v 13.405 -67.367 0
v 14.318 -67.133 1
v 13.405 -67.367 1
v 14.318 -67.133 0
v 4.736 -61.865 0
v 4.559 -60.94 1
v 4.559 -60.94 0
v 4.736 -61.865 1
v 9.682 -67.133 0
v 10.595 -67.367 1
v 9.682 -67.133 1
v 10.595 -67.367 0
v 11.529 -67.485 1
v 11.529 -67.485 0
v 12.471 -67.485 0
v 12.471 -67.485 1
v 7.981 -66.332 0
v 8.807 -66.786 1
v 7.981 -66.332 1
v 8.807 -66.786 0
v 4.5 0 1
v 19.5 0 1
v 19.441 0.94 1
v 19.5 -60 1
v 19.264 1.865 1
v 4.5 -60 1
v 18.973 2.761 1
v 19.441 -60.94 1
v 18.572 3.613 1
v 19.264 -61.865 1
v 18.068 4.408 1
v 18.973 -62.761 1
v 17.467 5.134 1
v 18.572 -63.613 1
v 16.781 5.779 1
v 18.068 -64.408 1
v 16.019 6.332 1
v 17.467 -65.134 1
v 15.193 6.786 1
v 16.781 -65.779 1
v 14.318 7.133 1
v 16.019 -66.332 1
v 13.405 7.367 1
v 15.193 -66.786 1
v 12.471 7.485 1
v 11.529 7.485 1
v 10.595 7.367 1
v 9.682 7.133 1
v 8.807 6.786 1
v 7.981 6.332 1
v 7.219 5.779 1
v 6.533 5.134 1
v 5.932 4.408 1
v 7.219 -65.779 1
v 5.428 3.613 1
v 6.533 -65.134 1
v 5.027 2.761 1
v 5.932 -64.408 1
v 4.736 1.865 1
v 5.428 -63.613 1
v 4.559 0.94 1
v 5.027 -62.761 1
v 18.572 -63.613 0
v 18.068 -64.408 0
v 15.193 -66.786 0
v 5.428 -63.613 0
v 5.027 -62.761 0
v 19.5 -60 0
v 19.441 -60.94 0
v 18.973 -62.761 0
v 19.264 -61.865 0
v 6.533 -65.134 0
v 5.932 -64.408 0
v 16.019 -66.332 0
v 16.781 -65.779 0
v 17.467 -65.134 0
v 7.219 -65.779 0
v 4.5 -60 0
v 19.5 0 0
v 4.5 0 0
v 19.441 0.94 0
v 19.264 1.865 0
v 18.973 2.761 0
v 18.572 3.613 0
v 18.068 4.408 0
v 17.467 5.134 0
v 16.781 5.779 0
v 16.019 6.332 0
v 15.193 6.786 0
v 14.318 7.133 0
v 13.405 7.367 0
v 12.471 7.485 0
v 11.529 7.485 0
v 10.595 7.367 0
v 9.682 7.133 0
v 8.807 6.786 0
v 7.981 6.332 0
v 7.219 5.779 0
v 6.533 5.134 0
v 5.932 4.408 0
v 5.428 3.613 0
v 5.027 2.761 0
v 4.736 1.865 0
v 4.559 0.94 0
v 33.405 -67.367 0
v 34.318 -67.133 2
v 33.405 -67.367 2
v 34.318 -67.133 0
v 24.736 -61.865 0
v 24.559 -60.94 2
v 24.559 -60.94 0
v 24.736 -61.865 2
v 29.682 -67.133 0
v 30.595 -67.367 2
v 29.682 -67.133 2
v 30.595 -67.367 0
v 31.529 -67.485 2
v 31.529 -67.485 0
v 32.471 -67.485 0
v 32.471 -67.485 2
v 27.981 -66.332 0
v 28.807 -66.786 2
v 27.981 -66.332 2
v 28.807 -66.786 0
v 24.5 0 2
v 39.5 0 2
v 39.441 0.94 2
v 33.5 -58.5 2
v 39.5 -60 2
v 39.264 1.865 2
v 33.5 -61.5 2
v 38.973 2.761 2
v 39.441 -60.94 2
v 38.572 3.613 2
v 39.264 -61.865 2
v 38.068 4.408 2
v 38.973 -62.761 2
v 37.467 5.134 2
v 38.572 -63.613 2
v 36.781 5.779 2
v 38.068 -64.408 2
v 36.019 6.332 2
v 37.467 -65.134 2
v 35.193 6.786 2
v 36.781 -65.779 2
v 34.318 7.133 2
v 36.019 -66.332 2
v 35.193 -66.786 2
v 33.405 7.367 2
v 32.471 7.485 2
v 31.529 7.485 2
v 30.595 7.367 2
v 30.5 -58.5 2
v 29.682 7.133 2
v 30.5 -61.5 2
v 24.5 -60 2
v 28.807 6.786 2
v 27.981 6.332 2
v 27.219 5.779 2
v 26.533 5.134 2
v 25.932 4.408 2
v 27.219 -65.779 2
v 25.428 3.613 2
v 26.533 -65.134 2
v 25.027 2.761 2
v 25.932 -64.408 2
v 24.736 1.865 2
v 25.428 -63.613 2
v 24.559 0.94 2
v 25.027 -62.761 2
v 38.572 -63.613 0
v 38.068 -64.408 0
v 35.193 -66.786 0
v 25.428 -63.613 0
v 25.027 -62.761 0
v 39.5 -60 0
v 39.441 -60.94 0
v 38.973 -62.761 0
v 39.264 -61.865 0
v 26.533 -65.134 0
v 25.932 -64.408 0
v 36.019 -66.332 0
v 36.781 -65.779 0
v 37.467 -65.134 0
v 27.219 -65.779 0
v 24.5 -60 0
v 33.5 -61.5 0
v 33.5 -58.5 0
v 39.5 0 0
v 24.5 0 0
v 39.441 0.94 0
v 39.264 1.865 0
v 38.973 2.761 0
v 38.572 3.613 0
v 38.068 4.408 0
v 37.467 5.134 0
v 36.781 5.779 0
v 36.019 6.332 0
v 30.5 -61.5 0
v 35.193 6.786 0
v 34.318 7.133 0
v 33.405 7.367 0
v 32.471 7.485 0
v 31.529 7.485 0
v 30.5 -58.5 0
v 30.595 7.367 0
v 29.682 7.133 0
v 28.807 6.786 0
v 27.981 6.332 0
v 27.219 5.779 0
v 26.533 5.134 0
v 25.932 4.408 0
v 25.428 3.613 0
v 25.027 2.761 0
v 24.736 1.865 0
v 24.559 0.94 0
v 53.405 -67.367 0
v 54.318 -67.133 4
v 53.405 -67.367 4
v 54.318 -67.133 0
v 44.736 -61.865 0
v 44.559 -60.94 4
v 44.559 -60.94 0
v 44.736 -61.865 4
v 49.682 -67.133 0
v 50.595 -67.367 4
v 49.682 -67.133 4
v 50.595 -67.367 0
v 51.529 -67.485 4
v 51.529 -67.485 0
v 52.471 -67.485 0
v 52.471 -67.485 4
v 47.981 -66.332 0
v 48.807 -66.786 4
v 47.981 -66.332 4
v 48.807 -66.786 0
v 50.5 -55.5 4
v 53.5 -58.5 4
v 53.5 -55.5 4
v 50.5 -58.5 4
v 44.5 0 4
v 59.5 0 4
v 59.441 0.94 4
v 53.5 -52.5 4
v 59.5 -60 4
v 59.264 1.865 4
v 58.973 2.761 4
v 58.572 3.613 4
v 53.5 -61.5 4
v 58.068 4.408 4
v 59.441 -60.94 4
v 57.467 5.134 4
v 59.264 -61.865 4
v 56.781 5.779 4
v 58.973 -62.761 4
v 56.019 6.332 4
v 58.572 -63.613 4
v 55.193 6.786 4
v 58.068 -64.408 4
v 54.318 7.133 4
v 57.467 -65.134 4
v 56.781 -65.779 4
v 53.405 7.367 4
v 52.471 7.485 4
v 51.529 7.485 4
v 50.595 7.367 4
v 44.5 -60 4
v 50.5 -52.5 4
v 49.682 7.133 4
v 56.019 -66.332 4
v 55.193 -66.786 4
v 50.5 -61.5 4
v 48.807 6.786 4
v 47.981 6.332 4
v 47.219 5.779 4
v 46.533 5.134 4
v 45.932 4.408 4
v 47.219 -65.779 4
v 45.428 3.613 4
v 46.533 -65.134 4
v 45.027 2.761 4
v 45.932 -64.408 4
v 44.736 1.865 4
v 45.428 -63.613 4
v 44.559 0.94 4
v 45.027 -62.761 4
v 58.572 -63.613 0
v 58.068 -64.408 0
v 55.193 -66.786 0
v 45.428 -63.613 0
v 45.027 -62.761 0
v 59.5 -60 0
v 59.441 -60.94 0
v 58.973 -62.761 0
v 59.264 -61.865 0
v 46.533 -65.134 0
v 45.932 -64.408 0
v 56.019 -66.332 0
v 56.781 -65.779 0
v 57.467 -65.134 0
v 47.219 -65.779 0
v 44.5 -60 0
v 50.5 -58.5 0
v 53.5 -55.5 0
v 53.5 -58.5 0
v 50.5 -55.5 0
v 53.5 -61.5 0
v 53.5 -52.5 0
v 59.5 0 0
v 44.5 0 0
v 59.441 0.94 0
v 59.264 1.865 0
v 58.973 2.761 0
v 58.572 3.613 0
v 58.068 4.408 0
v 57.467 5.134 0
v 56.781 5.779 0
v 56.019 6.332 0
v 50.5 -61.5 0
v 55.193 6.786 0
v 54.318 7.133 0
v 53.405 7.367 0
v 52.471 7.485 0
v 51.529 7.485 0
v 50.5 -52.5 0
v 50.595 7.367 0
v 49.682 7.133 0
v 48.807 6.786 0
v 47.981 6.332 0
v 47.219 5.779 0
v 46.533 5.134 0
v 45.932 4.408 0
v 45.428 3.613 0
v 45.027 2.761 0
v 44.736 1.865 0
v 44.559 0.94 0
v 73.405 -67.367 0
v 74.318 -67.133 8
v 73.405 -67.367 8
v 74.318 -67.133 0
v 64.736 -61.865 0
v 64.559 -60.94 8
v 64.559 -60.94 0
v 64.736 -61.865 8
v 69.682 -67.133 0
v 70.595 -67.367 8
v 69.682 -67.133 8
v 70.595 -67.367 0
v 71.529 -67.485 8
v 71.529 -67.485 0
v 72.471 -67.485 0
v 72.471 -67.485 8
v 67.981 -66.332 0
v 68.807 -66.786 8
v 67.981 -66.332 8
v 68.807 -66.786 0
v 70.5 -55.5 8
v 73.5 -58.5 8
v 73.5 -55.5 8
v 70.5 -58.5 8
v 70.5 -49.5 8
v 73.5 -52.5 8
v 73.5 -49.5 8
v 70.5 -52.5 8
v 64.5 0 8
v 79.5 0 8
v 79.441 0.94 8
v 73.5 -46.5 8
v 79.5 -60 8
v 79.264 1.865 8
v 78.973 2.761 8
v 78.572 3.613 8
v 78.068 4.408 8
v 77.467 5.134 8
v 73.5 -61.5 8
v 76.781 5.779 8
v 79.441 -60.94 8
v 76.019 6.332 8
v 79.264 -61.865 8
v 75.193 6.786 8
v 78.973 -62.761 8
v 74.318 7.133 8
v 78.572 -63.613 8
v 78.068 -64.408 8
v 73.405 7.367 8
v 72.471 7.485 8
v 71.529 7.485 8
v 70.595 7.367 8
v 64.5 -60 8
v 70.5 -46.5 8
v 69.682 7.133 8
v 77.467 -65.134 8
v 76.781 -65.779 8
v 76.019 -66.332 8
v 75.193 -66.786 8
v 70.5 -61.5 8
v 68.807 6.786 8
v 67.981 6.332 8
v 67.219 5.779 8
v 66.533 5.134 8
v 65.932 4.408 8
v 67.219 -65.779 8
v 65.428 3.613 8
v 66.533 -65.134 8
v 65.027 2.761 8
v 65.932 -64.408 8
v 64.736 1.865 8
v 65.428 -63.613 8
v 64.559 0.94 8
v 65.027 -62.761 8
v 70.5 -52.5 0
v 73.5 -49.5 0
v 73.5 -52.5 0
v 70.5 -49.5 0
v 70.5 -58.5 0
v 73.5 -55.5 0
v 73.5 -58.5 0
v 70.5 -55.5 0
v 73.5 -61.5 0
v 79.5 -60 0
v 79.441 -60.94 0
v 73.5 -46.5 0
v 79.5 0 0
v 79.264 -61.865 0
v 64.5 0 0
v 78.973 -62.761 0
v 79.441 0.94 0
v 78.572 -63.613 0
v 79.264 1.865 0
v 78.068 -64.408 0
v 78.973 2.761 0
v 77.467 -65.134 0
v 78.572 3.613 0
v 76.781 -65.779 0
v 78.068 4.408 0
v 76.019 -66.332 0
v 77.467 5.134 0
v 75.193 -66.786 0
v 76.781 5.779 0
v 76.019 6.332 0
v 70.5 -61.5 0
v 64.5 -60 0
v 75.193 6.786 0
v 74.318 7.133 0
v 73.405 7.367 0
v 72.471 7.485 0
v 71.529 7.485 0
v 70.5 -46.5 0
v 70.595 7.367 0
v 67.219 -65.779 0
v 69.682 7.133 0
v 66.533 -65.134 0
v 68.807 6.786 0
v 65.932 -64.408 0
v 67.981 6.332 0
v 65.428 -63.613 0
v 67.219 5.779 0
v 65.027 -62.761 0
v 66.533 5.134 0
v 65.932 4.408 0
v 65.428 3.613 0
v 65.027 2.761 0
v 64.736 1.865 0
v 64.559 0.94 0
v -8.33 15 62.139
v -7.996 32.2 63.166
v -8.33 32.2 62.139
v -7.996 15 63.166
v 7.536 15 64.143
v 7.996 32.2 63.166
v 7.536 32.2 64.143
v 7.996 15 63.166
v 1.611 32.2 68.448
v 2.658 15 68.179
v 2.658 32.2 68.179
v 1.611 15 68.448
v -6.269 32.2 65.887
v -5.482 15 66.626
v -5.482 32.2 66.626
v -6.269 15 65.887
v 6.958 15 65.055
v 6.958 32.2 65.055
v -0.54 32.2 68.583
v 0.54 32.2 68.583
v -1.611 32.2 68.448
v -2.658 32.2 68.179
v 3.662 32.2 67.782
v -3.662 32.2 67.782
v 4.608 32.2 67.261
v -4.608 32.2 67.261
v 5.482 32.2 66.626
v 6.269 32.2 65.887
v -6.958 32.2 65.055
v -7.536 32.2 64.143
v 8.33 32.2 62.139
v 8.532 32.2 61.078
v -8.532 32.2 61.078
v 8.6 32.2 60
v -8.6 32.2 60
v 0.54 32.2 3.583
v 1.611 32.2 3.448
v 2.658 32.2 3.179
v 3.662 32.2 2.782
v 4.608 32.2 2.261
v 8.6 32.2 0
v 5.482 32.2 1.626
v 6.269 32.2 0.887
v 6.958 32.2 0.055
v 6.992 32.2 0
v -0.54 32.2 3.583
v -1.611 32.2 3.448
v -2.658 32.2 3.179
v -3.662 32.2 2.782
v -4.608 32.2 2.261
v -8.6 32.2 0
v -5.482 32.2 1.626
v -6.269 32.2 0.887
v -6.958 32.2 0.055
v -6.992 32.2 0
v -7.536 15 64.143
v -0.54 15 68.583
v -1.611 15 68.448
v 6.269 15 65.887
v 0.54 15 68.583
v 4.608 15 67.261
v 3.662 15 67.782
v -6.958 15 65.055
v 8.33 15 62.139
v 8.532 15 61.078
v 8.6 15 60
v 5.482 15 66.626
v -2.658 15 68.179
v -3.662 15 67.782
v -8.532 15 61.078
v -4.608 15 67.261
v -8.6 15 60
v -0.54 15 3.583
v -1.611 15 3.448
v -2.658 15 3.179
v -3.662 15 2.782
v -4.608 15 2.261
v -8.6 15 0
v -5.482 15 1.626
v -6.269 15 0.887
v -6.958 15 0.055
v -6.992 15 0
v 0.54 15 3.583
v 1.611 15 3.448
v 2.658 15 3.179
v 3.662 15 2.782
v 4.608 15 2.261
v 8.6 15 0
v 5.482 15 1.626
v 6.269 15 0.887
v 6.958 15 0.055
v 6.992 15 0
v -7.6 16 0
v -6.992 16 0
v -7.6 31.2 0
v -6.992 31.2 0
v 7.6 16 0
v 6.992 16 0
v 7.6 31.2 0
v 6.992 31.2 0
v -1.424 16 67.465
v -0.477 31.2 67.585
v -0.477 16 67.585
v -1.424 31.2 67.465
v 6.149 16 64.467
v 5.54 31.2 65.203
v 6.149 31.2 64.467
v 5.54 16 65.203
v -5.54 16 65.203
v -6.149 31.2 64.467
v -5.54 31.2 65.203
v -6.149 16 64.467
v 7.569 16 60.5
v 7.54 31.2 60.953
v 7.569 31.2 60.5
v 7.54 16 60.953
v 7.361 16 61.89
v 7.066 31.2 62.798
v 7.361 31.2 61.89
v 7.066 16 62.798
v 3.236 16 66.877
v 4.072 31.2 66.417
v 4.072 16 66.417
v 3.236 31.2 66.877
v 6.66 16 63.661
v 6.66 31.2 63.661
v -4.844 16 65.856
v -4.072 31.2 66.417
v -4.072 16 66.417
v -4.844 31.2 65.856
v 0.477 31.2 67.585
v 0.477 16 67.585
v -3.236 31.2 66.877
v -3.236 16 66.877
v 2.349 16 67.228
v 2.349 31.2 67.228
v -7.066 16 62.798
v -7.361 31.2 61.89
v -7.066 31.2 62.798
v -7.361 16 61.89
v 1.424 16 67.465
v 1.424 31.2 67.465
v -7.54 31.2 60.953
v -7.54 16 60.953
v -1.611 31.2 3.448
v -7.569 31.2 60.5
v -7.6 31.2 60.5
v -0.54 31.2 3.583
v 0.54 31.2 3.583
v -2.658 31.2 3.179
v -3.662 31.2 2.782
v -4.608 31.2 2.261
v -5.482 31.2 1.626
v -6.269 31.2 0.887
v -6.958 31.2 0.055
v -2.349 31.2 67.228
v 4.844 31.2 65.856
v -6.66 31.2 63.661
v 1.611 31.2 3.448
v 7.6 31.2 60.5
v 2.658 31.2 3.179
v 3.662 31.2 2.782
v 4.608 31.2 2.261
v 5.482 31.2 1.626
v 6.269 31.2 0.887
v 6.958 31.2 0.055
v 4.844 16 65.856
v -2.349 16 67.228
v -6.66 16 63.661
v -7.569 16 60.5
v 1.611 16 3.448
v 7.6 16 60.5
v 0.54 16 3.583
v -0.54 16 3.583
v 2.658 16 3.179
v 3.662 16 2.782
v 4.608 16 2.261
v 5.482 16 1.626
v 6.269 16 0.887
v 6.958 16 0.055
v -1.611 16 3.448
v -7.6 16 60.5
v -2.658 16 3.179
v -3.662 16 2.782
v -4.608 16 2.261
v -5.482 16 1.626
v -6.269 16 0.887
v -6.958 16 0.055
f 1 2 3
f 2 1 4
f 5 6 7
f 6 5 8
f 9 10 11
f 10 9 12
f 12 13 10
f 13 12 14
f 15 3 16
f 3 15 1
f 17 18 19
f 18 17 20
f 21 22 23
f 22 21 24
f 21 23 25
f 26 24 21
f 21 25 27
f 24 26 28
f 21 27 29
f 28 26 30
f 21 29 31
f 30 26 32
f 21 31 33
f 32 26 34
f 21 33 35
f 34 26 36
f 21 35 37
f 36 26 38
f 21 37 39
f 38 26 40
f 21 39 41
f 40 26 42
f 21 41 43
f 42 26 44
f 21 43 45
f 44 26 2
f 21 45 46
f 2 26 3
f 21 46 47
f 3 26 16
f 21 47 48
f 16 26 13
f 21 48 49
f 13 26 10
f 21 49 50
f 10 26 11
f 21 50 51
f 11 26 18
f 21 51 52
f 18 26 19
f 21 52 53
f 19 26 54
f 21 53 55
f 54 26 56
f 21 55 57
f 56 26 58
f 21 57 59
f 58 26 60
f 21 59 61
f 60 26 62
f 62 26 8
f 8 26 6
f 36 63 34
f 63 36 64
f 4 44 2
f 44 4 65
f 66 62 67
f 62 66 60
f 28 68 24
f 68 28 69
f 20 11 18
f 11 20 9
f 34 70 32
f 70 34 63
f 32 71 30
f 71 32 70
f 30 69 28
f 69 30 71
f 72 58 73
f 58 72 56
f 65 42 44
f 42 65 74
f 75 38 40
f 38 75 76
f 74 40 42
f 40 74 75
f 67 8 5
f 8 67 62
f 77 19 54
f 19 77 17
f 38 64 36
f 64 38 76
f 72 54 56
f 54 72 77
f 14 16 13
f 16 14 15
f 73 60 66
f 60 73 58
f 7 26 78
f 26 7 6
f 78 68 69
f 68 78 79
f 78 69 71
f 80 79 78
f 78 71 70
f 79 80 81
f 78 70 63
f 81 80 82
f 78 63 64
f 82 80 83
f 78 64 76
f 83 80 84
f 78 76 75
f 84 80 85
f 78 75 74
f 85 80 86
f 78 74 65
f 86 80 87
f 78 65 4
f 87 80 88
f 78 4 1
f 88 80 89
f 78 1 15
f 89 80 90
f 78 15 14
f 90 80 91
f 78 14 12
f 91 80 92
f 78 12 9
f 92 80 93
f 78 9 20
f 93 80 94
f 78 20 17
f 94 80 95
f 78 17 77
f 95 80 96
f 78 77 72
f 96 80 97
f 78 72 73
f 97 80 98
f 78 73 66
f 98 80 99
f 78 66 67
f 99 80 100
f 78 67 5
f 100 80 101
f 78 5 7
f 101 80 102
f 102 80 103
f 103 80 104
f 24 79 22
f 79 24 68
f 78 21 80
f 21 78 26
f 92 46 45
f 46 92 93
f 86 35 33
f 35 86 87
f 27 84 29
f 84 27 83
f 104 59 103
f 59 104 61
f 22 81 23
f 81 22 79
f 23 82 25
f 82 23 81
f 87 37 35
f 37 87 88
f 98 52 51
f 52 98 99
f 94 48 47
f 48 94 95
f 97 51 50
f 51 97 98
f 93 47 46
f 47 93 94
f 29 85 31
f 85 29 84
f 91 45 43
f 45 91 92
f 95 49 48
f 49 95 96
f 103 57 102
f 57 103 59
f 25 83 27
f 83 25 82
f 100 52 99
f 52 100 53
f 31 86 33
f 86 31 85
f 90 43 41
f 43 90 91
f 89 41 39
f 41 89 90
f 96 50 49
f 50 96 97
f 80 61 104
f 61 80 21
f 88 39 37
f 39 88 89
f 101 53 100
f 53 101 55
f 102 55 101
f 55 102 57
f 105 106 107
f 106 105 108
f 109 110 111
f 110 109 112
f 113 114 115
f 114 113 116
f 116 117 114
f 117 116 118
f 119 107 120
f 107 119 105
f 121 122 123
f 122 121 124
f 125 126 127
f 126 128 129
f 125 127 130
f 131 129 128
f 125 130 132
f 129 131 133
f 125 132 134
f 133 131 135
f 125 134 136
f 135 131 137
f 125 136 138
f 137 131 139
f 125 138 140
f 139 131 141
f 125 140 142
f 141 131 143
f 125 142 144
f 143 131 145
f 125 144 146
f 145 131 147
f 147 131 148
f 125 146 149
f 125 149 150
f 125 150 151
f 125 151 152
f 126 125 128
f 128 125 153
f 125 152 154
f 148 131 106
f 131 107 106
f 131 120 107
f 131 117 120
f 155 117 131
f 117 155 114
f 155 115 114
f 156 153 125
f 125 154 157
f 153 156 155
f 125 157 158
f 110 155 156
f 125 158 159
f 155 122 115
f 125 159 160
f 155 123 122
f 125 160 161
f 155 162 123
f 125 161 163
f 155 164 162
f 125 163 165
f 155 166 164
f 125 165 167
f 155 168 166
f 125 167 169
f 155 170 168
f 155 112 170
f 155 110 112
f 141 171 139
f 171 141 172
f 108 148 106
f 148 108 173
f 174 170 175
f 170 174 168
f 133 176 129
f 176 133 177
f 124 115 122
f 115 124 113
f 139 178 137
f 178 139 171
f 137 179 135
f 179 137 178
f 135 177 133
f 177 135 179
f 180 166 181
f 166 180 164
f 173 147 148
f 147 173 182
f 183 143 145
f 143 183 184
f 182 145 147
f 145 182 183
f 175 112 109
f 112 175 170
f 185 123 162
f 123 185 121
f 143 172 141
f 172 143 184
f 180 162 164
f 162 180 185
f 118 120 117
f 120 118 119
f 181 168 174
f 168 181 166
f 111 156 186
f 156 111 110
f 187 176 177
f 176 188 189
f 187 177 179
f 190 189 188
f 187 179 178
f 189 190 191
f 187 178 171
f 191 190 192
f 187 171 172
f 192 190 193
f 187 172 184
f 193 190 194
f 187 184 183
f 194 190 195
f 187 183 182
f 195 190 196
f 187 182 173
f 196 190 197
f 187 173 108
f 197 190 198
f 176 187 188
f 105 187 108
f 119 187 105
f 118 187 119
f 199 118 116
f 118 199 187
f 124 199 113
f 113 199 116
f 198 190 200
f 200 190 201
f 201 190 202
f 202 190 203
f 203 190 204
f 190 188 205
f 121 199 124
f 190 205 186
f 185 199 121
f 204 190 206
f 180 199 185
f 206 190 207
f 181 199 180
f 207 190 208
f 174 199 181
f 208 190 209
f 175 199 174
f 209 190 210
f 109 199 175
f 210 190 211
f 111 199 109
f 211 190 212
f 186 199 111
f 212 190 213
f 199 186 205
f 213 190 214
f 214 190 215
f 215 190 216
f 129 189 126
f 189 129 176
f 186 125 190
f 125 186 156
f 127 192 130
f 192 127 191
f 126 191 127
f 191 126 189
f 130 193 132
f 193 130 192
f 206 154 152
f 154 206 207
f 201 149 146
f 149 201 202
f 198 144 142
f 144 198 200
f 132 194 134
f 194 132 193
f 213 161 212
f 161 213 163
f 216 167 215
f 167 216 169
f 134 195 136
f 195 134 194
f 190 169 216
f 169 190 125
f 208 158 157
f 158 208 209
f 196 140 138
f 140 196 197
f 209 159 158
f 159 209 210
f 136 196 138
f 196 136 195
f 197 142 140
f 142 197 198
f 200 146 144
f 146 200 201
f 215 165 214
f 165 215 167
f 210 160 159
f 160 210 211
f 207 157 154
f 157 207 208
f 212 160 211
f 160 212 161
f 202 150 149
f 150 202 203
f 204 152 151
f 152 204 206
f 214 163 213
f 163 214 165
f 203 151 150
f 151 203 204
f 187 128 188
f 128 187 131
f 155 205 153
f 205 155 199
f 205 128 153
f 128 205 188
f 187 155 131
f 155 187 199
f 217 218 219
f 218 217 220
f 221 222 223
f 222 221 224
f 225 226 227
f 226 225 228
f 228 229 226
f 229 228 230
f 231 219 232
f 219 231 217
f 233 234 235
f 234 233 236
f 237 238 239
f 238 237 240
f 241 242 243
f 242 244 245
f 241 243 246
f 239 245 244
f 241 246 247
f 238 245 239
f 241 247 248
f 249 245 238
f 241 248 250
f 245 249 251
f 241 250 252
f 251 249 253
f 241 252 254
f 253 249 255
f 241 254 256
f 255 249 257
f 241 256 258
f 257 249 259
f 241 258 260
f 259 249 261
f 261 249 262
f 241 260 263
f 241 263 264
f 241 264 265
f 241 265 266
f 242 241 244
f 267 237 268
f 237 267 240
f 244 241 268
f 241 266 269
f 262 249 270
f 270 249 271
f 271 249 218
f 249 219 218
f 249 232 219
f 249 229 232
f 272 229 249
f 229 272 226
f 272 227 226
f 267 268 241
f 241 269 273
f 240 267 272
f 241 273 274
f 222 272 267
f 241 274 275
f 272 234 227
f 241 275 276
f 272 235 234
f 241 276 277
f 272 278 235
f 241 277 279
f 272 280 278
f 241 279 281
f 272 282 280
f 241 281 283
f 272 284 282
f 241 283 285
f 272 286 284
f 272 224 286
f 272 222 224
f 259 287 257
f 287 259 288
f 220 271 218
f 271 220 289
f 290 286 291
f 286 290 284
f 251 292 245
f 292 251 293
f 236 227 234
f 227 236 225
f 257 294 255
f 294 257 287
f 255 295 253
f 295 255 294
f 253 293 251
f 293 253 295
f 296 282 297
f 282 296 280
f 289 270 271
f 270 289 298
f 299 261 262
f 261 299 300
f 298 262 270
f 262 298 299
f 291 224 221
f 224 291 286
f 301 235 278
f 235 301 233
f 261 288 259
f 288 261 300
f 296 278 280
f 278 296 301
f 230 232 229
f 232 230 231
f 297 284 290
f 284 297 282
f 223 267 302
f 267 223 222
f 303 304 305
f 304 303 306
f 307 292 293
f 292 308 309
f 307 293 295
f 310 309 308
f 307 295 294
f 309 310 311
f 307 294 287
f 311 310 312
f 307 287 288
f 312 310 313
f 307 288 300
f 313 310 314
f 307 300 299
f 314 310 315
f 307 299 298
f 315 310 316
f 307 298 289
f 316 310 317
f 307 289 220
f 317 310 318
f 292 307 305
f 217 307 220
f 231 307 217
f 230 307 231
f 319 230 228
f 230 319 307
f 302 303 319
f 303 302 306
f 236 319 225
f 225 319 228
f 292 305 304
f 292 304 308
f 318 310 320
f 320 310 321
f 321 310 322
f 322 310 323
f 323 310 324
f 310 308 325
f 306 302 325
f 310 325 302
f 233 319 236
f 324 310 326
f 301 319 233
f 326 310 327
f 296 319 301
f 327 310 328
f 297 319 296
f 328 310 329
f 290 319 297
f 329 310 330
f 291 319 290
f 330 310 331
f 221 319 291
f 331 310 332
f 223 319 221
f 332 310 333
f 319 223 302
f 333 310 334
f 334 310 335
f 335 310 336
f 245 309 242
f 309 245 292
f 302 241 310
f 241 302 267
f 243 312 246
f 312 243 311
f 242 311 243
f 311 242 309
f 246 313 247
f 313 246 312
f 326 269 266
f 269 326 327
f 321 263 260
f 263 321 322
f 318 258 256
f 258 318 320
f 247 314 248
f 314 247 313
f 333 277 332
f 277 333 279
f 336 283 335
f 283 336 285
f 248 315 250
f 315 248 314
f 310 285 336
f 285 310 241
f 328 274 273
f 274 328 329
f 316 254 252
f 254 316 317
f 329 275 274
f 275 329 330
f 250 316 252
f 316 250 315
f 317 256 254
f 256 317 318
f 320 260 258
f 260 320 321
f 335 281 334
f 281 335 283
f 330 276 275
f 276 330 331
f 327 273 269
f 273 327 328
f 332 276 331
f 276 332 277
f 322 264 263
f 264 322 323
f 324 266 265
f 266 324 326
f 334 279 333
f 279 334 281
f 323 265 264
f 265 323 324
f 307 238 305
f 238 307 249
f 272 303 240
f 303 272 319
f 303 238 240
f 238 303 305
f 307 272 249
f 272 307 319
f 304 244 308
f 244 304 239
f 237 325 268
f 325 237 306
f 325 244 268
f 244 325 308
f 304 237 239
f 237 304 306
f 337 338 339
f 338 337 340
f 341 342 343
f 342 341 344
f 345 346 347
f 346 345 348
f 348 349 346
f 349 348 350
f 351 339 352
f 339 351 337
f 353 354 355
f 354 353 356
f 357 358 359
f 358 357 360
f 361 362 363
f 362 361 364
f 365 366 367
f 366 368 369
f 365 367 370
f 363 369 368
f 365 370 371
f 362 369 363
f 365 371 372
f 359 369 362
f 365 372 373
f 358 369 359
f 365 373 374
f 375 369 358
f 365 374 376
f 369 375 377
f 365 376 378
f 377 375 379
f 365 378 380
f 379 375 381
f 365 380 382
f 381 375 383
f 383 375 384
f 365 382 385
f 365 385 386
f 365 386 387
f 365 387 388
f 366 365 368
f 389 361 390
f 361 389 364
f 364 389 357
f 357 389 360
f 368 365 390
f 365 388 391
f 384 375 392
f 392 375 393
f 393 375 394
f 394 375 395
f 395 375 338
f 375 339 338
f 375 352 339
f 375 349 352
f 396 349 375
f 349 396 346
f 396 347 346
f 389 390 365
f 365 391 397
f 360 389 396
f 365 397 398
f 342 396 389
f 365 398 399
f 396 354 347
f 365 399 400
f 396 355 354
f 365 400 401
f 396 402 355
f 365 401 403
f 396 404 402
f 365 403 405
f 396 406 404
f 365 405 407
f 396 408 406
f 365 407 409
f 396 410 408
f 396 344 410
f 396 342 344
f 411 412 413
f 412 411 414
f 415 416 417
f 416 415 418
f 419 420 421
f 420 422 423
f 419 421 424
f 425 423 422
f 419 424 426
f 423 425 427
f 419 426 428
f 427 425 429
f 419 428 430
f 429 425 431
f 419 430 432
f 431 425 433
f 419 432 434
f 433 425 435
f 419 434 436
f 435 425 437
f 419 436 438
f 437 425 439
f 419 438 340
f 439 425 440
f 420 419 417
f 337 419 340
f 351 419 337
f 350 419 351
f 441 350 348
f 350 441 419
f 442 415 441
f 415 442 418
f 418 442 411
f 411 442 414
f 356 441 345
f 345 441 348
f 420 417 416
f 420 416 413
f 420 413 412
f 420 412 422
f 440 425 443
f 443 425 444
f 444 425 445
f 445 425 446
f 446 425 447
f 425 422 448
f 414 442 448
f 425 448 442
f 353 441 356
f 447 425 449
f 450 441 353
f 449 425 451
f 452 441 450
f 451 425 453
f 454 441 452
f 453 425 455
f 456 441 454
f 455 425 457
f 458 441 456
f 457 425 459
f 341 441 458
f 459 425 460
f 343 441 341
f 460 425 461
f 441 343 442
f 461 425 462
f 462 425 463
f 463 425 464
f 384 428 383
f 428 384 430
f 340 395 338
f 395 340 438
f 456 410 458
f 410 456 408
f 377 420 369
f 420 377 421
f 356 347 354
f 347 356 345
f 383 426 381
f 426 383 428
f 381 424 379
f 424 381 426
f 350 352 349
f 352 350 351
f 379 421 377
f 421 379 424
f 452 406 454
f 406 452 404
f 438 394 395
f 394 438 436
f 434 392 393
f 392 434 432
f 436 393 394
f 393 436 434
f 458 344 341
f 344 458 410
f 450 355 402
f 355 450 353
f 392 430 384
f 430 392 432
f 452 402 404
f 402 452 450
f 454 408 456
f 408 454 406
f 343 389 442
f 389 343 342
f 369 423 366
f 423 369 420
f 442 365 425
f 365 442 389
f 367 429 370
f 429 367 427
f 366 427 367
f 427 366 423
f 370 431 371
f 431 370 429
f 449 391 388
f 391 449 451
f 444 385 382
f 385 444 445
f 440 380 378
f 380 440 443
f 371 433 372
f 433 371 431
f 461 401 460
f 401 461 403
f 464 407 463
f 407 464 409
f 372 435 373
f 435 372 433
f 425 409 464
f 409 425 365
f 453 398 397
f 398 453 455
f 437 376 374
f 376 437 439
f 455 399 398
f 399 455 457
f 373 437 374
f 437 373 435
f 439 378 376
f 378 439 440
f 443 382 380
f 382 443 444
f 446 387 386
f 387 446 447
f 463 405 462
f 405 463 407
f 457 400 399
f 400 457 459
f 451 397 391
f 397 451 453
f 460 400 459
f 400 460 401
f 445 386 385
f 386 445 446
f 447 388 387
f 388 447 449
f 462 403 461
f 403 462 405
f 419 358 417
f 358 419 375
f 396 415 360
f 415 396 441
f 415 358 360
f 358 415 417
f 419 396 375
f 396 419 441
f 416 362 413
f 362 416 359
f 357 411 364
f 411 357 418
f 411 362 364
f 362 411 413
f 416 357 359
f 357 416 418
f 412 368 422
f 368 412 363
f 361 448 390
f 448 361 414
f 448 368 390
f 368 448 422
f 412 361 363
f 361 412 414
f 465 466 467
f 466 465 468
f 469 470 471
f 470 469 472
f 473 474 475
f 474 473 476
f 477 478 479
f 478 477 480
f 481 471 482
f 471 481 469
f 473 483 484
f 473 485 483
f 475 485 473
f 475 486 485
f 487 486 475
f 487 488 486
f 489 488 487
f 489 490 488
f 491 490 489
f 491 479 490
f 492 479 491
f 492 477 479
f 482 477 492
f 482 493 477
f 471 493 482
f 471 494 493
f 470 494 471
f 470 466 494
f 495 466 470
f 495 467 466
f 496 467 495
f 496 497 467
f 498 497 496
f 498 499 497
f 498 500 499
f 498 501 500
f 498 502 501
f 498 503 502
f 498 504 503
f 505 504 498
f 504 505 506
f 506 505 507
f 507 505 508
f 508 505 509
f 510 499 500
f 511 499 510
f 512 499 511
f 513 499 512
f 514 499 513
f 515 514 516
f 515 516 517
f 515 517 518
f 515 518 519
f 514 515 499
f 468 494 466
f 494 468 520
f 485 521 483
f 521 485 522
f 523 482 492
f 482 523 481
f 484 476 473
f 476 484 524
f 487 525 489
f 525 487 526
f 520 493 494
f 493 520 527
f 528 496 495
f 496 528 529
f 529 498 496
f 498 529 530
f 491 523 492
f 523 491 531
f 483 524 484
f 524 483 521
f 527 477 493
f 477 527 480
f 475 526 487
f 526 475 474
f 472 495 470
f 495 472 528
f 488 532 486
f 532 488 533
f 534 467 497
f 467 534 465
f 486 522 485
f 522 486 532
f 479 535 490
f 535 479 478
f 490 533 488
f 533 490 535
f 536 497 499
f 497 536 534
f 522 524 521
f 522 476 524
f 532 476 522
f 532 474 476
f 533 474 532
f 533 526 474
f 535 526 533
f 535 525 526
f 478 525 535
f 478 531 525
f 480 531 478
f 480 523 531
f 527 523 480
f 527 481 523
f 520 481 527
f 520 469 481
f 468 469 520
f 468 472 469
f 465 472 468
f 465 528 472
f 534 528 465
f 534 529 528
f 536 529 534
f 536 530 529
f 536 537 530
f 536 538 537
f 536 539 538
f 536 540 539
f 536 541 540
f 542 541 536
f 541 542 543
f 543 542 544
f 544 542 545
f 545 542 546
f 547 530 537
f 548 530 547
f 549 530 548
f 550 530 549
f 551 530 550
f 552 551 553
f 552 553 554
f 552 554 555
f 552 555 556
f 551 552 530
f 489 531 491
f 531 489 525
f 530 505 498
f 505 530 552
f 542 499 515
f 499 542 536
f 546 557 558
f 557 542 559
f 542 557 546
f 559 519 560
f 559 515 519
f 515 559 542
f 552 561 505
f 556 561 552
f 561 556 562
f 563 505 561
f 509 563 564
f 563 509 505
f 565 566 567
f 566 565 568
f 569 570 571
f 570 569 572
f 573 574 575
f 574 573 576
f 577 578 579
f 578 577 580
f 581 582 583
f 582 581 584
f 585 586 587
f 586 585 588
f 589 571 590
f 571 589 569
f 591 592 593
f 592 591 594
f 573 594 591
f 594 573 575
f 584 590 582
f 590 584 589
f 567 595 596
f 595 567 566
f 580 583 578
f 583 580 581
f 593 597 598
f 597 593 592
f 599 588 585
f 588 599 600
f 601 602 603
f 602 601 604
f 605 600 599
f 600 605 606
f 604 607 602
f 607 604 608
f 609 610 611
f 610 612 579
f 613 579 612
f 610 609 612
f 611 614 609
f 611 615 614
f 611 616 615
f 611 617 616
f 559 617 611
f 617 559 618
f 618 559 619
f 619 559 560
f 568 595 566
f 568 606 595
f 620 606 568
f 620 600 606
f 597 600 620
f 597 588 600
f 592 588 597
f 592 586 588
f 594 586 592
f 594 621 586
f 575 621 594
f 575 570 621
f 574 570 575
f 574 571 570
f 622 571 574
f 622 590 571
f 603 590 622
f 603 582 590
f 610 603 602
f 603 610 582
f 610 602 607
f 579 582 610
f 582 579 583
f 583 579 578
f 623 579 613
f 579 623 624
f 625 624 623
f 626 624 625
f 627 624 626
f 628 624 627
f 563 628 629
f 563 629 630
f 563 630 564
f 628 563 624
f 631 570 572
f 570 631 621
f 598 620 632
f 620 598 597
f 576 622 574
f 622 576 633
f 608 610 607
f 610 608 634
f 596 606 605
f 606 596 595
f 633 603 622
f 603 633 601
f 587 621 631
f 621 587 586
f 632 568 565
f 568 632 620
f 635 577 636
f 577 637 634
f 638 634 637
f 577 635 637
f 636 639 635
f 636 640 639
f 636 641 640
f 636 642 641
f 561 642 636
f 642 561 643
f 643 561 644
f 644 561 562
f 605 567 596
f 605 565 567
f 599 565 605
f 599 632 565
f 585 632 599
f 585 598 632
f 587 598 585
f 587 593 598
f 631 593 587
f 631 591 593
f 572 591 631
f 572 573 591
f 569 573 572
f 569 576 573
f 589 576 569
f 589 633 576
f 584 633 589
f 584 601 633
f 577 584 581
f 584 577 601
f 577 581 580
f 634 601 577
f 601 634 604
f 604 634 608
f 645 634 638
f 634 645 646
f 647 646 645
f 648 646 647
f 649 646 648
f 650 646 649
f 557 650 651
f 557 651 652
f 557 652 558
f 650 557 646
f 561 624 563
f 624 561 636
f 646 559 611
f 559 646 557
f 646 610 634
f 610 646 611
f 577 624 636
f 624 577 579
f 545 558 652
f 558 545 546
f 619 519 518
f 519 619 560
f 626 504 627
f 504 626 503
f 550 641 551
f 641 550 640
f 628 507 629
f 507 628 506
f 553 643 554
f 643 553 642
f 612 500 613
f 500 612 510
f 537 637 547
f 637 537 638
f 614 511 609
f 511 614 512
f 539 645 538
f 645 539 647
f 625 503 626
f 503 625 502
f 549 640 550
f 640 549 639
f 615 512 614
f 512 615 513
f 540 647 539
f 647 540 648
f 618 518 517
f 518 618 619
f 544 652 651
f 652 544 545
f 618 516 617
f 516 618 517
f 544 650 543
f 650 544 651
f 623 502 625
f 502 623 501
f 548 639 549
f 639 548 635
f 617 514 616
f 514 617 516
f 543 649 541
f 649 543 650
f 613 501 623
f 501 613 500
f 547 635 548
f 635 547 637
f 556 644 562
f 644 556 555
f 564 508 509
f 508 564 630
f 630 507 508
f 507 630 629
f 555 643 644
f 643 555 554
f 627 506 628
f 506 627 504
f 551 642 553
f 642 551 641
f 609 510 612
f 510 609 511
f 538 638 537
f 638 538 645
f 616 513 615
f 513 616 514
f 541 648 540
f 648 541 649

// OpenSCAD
// binary feeler gauge
// version 0.0.1
// by pixelhaufen
// is licensed under CC BY-SA 3.0 -> https://creativecommons.org/licenses/by-sa/3.0/

// for heights without feeler combine them
// * 1 = 2^0
// * 2 =       2^1
// + 3 = 2^0 + 2^1
// * 4 =             2^2
// + 5 = 2^0 +       2^2
// + 6 =       2^1 + 2^2
// + 7 = 2^0 + 2^1 + 2^2
// * 8 =                   2^3
// + 9 = 2^0 +             2^3
// + ...
// + 15 = 2^0 + 2^1 + 2^2 + 2^3
// * 16 =                       + 2^4
// ...

//------------------------------------------------------------------
// User Inputs

case = "yes"; // [yes,no]
unit_type = "1 mm"; // [1 mm, 100 um, both]
feeler = "all"; // [all, single, none]
// 2^
height_of_feeler = 3; // [0:8]

/*[Hidden]*/
$fn = 50;
number = height_of_feeler;
unit = return_unit(unit_type);

//------------------------------------------------------------------
// Main

// feeler
if (feeler=="single")
{
    if (unit_type != "both")
    {
        translate([12,-60,0])
            feeler(unit,number);
    }
    else
    {
        // error
        echo ("Feeler unit type can't be both for single feeler.");
    }
}
else if (feeler=="all")
{
    if(unit_type == "1 mm" || unit_type == "both")
    {
        for (i = [0:number])
        {
            translate([12+i*20,-60,0]) feeler(1,i);
        }
    }
    if(unit_type == "100 um" || unit_type == "both")
    {
        for (i = [0:number])
        {
            translate([-12-i*20,-60,0]) feeler(.1,i);
        }
    }
}

// case
if(case=="yes")
{
    rotate([-90,0,0])
    translate([0,-60,15])
        case(unit,number);
}

//------------------------------------------------------------------
// Function

function return_unit(unit_type) = 
    unit_type=="1 mm"
    ? 1
    : unit_type=="100 um"
        ? 0.1
        : 1.1;

//------------------------------------------------------------------
// Modules

module case(unit,number)
{
    height=pow(2,number+1)*unit+2.2-unit;
    width=17.2;
    
    translate([0,0,height/2])
    difference()
    {
        union()
        {
            cylinder(r1=width/2,r2=width/2,h=height,center=true);
            translate([0,30,0]) cube([width,60,height],center=true);
            
        }
        translate([0,65,0]) cylinder(r1=width/2,r2=width/2,h=height+0.1,center=true);
        union()
        {
            cylinder(r1=(width-2)/2,r2=(width-2)/2,h=height-2,center=true);
            translate([0,30,0]) cube([width-2,61,height-2],center=true);
            
        }
    }
}

module feeler(unit,number)
{
    height=pow(2,number)*unit;
    width=15;
    
    translate([0,0,height/2])
    difference()
    {
        union()
        {
            cylinder(r1=width/2,r2=width/2,h=height,center=true);
            translate([0,30,0]) cube([width,60,height],center=true);
            translate([0,60,0]) cylinder(r1=width/2,r2=width/2,h=height,center=true);
        }
        
        loop = number-1;
        if(number > 0)
        {
            for (i = [0:loop])
            {
                translate([0,i*6,0]) cube([3,3,height+0.1],center=true);
            }
        }
    }
}
